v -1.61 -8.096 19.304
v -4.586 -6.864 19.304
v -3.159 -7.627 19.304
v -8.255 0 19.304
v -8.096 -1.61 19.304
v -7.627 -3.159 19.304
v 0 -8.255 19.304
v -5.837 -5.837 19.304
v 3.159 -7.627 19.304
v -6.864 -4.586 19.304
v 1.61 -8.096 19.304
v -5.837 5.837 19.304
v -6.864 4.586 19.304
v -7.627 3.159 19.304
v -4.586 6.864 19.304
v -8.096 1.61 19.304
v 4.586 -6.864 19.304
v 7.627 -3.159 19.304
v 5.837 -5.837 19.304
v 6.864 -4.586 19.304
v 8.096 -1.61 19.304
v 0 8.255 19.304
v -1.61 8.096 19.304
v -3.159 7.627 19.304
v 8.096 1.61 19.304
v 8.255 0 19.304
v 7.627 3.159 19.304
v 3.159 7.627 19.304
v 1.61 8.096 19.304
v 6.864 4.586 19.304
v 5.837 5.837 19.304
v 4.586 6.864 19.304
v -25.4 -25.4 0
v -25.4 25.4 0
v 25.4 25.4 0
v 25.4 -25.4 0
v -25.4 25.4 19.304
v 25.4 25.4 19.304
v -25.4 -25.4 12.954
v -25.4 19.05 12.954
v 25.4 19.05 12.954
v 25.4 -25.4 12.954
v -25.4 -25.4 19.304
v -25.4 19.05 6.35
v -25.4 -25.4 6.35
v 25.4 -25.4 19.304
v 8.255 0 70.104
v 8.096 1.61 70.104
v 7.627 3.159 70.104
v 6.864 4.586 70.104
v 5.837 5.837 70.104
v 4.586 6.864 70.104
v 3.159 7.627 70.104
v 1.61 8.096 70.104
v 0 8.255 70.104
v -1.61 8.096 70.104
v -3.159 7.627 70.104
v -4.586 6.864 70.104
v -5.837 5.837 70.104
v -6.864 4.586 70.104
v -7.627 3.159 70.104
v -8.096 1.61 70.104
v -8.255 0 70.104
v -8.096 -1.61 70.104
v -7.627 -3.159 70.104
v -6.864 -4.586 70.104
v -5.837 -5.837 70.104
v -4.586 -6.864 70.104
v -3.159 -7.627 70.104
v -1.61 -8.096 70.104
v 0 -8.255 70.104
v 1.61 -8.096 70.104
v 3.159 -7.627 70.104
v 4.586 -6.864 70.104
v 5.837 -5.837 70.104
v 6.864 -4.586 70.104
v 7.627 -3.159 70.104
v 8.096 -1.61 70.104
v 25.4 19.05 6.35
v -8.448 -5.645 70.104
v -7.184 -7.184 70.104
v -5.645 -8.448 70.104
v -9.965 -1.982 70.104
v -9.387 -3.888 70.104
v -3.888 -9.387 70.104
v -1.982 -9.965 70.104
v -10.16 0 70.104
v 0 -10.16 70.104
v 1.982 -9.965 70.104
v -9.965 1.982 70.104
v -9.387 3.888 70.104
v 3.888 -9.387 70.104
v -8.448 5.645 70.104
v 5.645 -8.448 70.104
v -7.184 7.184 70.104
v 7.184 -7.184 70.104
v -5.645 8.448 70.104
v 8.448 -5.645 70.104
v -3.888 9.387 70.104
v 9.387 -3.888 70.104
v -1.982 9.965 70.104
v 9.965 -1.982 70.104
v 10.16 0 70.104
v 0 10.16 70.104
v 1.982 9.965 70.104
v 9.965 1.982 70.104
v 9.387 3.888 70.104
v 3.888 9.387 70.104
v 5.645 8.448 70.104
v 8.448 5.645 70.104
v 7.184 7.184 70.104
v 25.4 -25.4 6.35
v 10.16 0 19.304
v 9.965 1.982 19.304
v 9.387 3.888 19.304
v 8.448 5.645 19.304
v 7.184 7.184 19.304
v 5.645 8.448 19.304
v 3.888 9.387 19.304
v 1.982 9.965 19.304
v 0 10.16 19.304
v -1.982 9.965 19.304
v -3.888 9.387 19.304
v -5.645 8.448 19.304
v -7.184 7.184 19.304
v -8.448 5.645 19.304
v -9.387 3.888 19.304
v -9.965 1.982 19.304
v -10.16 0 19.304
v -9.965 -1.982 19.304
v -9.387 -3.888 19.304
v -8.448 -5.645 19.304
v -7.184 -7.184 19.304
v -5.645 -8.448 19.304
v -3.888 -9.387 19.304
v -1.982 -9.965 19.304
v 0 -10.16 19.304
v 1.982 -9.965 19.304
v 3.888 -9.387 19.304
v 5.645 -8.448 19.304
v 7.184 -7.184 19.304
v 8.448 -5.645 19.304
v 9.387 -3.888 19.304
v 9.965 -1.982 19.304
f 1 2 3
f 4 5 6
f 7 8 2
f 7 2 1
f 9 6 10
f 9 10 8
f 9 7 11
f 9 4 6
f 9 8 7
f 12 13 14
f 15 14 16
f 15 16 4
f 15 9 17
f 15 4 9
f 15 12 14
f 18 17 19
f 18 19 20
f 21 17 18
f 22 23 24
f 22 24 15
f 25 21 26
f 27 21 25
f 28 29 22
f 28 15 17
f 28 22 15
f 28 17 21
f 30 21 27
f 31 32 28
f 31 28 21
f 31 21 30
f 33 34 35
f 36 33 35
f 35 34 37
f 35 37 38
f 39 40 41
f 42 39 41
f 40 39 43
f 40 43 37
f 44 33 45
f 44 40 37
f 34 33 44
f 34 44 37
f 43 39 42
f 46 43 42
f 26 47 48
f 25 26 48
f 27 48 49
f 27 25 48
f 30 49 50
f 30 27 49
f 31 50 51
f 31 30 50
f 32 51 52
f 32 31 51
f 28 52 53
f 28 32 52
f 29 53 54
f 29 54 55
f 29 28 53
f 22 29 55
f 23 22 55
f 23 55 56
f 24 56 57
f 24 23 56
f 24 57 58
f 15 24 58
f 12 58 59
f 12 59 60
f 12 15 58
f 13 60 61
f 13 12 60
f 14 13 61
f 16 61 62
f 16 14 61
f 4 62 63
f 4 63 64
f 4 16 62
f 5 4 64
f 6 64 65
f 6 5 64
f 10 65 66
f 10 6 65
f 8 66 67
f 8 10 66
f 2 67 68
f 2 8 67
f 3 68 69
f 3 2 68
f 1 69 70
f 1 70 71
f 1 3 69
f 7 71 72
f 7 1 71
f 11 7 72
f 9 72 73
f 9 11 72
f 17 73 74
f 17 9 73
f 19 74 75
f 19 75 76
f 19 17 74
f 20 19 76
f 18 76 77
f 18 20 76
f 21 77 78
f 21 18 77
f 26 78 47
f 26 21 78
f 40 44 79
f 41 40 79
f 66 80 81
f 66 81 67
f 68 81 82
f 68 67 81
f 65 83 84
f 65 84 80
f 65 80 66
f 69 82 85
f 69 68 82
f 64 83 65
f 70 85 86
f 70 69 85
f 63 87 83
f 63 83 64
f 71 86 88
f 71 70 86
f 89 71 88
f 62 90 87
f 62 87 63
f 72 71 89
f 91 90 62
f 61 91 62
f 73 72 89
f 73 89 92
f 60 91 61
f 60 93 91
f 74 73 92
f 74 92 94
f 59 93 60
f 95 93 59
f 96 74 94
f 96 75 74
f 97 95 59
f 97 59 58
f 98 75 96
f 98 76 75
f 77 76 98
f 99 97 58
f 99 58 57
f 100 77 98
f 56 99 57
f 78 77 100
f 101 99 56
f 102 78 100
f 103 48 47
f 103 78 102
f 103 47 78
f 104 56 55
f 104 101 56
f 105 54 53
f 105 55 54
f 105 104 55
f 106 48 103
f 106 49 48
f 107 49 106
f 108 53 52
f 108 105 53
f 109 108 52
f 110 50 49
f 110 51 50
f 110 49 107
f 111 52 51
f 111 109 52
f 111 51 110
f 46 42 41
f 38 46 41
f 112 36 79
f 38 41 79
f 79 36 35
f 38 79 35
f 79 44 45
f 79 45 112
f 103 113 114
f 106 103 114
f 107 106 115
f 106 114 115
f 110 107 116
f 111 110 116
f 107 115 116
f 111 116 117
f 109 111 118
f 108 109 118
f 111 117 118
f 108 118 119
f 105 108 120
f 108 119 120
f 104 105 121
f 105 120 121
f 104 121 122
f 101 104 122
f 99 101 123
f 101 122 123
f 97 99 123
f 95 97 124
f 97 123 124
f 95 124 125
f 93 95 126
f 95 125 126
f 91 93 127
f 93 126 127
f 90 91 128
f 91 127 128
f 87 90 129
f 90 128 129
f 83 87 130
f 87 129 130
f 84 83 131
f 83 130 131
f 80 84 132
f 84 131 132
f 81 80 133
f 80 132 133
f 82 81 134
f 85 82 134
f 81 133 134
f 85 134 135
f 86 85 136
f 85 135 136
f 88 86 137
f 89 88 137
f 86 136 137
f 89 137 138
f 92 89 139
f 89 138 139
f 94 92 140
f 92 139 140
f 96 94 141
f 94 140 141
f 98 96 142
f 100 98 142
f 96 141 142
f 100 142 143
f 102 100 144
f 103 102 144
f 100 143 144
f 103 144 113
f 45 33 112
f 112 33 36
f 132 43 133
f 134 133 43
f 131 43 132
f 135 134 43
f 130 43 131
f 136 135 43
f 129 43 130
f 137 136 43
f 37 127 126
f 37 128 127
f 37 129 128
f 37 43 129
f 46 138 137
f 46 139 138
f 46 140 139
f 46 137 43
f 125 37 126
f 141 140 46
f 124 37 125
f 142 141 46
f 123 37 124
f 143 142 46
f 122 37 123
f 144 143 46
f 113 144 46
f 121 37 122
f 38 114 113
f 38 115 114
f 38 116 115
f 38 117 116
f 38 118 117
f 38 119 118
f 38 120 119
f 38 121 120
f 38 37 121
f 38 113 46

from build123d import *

# Parameters (mm, degrees)
F0_W     = 50.8
F0_H     = 50.8
F1_DEPTH = 6.35
F2_W     = 50.8
F2_H     = 6.35
F3_DEPTH = 6.604
F4_W     = 50.8
F4_H     = 50.8
F5_DEPTH = 6.35
F6_R     = 10.16
F6_R_2   = 8.255
F7_DEPTH = 50.8


with BuildPart() as f1:
    # F0 (on Top) → F1 (new body)
    with BuildSketch(Plane.XY):
        Rectangle(F0_W, F0_H)
    extrude(amount=F1_DEPTH)

    # F2 (on face) → F3 (join)
    with BuildSketch(Plane.XY.offset(6.35)):
        with Locations((0, 22.225)):
            Rectangle(F2_W, F2_H)
    extrude(amount=F3_DEPTH)

    # F4 (on face) → F5 (join)
    with BuildSketch(Plane.XY.offset(12.954)):
        Rectangle(F4_W, F4_H)
    extrude(amount=F5_DEPTH)

    # F6 (on face) → F7 (join)
    with BuildSketch(Plane.XY.offset(19.304)):
        Circle(F6_R)
        Circle(F6_R_2, mode=Mode.SUBTRACT)
    extrude(amount=F7_DEPTH)


solid = f1.part
